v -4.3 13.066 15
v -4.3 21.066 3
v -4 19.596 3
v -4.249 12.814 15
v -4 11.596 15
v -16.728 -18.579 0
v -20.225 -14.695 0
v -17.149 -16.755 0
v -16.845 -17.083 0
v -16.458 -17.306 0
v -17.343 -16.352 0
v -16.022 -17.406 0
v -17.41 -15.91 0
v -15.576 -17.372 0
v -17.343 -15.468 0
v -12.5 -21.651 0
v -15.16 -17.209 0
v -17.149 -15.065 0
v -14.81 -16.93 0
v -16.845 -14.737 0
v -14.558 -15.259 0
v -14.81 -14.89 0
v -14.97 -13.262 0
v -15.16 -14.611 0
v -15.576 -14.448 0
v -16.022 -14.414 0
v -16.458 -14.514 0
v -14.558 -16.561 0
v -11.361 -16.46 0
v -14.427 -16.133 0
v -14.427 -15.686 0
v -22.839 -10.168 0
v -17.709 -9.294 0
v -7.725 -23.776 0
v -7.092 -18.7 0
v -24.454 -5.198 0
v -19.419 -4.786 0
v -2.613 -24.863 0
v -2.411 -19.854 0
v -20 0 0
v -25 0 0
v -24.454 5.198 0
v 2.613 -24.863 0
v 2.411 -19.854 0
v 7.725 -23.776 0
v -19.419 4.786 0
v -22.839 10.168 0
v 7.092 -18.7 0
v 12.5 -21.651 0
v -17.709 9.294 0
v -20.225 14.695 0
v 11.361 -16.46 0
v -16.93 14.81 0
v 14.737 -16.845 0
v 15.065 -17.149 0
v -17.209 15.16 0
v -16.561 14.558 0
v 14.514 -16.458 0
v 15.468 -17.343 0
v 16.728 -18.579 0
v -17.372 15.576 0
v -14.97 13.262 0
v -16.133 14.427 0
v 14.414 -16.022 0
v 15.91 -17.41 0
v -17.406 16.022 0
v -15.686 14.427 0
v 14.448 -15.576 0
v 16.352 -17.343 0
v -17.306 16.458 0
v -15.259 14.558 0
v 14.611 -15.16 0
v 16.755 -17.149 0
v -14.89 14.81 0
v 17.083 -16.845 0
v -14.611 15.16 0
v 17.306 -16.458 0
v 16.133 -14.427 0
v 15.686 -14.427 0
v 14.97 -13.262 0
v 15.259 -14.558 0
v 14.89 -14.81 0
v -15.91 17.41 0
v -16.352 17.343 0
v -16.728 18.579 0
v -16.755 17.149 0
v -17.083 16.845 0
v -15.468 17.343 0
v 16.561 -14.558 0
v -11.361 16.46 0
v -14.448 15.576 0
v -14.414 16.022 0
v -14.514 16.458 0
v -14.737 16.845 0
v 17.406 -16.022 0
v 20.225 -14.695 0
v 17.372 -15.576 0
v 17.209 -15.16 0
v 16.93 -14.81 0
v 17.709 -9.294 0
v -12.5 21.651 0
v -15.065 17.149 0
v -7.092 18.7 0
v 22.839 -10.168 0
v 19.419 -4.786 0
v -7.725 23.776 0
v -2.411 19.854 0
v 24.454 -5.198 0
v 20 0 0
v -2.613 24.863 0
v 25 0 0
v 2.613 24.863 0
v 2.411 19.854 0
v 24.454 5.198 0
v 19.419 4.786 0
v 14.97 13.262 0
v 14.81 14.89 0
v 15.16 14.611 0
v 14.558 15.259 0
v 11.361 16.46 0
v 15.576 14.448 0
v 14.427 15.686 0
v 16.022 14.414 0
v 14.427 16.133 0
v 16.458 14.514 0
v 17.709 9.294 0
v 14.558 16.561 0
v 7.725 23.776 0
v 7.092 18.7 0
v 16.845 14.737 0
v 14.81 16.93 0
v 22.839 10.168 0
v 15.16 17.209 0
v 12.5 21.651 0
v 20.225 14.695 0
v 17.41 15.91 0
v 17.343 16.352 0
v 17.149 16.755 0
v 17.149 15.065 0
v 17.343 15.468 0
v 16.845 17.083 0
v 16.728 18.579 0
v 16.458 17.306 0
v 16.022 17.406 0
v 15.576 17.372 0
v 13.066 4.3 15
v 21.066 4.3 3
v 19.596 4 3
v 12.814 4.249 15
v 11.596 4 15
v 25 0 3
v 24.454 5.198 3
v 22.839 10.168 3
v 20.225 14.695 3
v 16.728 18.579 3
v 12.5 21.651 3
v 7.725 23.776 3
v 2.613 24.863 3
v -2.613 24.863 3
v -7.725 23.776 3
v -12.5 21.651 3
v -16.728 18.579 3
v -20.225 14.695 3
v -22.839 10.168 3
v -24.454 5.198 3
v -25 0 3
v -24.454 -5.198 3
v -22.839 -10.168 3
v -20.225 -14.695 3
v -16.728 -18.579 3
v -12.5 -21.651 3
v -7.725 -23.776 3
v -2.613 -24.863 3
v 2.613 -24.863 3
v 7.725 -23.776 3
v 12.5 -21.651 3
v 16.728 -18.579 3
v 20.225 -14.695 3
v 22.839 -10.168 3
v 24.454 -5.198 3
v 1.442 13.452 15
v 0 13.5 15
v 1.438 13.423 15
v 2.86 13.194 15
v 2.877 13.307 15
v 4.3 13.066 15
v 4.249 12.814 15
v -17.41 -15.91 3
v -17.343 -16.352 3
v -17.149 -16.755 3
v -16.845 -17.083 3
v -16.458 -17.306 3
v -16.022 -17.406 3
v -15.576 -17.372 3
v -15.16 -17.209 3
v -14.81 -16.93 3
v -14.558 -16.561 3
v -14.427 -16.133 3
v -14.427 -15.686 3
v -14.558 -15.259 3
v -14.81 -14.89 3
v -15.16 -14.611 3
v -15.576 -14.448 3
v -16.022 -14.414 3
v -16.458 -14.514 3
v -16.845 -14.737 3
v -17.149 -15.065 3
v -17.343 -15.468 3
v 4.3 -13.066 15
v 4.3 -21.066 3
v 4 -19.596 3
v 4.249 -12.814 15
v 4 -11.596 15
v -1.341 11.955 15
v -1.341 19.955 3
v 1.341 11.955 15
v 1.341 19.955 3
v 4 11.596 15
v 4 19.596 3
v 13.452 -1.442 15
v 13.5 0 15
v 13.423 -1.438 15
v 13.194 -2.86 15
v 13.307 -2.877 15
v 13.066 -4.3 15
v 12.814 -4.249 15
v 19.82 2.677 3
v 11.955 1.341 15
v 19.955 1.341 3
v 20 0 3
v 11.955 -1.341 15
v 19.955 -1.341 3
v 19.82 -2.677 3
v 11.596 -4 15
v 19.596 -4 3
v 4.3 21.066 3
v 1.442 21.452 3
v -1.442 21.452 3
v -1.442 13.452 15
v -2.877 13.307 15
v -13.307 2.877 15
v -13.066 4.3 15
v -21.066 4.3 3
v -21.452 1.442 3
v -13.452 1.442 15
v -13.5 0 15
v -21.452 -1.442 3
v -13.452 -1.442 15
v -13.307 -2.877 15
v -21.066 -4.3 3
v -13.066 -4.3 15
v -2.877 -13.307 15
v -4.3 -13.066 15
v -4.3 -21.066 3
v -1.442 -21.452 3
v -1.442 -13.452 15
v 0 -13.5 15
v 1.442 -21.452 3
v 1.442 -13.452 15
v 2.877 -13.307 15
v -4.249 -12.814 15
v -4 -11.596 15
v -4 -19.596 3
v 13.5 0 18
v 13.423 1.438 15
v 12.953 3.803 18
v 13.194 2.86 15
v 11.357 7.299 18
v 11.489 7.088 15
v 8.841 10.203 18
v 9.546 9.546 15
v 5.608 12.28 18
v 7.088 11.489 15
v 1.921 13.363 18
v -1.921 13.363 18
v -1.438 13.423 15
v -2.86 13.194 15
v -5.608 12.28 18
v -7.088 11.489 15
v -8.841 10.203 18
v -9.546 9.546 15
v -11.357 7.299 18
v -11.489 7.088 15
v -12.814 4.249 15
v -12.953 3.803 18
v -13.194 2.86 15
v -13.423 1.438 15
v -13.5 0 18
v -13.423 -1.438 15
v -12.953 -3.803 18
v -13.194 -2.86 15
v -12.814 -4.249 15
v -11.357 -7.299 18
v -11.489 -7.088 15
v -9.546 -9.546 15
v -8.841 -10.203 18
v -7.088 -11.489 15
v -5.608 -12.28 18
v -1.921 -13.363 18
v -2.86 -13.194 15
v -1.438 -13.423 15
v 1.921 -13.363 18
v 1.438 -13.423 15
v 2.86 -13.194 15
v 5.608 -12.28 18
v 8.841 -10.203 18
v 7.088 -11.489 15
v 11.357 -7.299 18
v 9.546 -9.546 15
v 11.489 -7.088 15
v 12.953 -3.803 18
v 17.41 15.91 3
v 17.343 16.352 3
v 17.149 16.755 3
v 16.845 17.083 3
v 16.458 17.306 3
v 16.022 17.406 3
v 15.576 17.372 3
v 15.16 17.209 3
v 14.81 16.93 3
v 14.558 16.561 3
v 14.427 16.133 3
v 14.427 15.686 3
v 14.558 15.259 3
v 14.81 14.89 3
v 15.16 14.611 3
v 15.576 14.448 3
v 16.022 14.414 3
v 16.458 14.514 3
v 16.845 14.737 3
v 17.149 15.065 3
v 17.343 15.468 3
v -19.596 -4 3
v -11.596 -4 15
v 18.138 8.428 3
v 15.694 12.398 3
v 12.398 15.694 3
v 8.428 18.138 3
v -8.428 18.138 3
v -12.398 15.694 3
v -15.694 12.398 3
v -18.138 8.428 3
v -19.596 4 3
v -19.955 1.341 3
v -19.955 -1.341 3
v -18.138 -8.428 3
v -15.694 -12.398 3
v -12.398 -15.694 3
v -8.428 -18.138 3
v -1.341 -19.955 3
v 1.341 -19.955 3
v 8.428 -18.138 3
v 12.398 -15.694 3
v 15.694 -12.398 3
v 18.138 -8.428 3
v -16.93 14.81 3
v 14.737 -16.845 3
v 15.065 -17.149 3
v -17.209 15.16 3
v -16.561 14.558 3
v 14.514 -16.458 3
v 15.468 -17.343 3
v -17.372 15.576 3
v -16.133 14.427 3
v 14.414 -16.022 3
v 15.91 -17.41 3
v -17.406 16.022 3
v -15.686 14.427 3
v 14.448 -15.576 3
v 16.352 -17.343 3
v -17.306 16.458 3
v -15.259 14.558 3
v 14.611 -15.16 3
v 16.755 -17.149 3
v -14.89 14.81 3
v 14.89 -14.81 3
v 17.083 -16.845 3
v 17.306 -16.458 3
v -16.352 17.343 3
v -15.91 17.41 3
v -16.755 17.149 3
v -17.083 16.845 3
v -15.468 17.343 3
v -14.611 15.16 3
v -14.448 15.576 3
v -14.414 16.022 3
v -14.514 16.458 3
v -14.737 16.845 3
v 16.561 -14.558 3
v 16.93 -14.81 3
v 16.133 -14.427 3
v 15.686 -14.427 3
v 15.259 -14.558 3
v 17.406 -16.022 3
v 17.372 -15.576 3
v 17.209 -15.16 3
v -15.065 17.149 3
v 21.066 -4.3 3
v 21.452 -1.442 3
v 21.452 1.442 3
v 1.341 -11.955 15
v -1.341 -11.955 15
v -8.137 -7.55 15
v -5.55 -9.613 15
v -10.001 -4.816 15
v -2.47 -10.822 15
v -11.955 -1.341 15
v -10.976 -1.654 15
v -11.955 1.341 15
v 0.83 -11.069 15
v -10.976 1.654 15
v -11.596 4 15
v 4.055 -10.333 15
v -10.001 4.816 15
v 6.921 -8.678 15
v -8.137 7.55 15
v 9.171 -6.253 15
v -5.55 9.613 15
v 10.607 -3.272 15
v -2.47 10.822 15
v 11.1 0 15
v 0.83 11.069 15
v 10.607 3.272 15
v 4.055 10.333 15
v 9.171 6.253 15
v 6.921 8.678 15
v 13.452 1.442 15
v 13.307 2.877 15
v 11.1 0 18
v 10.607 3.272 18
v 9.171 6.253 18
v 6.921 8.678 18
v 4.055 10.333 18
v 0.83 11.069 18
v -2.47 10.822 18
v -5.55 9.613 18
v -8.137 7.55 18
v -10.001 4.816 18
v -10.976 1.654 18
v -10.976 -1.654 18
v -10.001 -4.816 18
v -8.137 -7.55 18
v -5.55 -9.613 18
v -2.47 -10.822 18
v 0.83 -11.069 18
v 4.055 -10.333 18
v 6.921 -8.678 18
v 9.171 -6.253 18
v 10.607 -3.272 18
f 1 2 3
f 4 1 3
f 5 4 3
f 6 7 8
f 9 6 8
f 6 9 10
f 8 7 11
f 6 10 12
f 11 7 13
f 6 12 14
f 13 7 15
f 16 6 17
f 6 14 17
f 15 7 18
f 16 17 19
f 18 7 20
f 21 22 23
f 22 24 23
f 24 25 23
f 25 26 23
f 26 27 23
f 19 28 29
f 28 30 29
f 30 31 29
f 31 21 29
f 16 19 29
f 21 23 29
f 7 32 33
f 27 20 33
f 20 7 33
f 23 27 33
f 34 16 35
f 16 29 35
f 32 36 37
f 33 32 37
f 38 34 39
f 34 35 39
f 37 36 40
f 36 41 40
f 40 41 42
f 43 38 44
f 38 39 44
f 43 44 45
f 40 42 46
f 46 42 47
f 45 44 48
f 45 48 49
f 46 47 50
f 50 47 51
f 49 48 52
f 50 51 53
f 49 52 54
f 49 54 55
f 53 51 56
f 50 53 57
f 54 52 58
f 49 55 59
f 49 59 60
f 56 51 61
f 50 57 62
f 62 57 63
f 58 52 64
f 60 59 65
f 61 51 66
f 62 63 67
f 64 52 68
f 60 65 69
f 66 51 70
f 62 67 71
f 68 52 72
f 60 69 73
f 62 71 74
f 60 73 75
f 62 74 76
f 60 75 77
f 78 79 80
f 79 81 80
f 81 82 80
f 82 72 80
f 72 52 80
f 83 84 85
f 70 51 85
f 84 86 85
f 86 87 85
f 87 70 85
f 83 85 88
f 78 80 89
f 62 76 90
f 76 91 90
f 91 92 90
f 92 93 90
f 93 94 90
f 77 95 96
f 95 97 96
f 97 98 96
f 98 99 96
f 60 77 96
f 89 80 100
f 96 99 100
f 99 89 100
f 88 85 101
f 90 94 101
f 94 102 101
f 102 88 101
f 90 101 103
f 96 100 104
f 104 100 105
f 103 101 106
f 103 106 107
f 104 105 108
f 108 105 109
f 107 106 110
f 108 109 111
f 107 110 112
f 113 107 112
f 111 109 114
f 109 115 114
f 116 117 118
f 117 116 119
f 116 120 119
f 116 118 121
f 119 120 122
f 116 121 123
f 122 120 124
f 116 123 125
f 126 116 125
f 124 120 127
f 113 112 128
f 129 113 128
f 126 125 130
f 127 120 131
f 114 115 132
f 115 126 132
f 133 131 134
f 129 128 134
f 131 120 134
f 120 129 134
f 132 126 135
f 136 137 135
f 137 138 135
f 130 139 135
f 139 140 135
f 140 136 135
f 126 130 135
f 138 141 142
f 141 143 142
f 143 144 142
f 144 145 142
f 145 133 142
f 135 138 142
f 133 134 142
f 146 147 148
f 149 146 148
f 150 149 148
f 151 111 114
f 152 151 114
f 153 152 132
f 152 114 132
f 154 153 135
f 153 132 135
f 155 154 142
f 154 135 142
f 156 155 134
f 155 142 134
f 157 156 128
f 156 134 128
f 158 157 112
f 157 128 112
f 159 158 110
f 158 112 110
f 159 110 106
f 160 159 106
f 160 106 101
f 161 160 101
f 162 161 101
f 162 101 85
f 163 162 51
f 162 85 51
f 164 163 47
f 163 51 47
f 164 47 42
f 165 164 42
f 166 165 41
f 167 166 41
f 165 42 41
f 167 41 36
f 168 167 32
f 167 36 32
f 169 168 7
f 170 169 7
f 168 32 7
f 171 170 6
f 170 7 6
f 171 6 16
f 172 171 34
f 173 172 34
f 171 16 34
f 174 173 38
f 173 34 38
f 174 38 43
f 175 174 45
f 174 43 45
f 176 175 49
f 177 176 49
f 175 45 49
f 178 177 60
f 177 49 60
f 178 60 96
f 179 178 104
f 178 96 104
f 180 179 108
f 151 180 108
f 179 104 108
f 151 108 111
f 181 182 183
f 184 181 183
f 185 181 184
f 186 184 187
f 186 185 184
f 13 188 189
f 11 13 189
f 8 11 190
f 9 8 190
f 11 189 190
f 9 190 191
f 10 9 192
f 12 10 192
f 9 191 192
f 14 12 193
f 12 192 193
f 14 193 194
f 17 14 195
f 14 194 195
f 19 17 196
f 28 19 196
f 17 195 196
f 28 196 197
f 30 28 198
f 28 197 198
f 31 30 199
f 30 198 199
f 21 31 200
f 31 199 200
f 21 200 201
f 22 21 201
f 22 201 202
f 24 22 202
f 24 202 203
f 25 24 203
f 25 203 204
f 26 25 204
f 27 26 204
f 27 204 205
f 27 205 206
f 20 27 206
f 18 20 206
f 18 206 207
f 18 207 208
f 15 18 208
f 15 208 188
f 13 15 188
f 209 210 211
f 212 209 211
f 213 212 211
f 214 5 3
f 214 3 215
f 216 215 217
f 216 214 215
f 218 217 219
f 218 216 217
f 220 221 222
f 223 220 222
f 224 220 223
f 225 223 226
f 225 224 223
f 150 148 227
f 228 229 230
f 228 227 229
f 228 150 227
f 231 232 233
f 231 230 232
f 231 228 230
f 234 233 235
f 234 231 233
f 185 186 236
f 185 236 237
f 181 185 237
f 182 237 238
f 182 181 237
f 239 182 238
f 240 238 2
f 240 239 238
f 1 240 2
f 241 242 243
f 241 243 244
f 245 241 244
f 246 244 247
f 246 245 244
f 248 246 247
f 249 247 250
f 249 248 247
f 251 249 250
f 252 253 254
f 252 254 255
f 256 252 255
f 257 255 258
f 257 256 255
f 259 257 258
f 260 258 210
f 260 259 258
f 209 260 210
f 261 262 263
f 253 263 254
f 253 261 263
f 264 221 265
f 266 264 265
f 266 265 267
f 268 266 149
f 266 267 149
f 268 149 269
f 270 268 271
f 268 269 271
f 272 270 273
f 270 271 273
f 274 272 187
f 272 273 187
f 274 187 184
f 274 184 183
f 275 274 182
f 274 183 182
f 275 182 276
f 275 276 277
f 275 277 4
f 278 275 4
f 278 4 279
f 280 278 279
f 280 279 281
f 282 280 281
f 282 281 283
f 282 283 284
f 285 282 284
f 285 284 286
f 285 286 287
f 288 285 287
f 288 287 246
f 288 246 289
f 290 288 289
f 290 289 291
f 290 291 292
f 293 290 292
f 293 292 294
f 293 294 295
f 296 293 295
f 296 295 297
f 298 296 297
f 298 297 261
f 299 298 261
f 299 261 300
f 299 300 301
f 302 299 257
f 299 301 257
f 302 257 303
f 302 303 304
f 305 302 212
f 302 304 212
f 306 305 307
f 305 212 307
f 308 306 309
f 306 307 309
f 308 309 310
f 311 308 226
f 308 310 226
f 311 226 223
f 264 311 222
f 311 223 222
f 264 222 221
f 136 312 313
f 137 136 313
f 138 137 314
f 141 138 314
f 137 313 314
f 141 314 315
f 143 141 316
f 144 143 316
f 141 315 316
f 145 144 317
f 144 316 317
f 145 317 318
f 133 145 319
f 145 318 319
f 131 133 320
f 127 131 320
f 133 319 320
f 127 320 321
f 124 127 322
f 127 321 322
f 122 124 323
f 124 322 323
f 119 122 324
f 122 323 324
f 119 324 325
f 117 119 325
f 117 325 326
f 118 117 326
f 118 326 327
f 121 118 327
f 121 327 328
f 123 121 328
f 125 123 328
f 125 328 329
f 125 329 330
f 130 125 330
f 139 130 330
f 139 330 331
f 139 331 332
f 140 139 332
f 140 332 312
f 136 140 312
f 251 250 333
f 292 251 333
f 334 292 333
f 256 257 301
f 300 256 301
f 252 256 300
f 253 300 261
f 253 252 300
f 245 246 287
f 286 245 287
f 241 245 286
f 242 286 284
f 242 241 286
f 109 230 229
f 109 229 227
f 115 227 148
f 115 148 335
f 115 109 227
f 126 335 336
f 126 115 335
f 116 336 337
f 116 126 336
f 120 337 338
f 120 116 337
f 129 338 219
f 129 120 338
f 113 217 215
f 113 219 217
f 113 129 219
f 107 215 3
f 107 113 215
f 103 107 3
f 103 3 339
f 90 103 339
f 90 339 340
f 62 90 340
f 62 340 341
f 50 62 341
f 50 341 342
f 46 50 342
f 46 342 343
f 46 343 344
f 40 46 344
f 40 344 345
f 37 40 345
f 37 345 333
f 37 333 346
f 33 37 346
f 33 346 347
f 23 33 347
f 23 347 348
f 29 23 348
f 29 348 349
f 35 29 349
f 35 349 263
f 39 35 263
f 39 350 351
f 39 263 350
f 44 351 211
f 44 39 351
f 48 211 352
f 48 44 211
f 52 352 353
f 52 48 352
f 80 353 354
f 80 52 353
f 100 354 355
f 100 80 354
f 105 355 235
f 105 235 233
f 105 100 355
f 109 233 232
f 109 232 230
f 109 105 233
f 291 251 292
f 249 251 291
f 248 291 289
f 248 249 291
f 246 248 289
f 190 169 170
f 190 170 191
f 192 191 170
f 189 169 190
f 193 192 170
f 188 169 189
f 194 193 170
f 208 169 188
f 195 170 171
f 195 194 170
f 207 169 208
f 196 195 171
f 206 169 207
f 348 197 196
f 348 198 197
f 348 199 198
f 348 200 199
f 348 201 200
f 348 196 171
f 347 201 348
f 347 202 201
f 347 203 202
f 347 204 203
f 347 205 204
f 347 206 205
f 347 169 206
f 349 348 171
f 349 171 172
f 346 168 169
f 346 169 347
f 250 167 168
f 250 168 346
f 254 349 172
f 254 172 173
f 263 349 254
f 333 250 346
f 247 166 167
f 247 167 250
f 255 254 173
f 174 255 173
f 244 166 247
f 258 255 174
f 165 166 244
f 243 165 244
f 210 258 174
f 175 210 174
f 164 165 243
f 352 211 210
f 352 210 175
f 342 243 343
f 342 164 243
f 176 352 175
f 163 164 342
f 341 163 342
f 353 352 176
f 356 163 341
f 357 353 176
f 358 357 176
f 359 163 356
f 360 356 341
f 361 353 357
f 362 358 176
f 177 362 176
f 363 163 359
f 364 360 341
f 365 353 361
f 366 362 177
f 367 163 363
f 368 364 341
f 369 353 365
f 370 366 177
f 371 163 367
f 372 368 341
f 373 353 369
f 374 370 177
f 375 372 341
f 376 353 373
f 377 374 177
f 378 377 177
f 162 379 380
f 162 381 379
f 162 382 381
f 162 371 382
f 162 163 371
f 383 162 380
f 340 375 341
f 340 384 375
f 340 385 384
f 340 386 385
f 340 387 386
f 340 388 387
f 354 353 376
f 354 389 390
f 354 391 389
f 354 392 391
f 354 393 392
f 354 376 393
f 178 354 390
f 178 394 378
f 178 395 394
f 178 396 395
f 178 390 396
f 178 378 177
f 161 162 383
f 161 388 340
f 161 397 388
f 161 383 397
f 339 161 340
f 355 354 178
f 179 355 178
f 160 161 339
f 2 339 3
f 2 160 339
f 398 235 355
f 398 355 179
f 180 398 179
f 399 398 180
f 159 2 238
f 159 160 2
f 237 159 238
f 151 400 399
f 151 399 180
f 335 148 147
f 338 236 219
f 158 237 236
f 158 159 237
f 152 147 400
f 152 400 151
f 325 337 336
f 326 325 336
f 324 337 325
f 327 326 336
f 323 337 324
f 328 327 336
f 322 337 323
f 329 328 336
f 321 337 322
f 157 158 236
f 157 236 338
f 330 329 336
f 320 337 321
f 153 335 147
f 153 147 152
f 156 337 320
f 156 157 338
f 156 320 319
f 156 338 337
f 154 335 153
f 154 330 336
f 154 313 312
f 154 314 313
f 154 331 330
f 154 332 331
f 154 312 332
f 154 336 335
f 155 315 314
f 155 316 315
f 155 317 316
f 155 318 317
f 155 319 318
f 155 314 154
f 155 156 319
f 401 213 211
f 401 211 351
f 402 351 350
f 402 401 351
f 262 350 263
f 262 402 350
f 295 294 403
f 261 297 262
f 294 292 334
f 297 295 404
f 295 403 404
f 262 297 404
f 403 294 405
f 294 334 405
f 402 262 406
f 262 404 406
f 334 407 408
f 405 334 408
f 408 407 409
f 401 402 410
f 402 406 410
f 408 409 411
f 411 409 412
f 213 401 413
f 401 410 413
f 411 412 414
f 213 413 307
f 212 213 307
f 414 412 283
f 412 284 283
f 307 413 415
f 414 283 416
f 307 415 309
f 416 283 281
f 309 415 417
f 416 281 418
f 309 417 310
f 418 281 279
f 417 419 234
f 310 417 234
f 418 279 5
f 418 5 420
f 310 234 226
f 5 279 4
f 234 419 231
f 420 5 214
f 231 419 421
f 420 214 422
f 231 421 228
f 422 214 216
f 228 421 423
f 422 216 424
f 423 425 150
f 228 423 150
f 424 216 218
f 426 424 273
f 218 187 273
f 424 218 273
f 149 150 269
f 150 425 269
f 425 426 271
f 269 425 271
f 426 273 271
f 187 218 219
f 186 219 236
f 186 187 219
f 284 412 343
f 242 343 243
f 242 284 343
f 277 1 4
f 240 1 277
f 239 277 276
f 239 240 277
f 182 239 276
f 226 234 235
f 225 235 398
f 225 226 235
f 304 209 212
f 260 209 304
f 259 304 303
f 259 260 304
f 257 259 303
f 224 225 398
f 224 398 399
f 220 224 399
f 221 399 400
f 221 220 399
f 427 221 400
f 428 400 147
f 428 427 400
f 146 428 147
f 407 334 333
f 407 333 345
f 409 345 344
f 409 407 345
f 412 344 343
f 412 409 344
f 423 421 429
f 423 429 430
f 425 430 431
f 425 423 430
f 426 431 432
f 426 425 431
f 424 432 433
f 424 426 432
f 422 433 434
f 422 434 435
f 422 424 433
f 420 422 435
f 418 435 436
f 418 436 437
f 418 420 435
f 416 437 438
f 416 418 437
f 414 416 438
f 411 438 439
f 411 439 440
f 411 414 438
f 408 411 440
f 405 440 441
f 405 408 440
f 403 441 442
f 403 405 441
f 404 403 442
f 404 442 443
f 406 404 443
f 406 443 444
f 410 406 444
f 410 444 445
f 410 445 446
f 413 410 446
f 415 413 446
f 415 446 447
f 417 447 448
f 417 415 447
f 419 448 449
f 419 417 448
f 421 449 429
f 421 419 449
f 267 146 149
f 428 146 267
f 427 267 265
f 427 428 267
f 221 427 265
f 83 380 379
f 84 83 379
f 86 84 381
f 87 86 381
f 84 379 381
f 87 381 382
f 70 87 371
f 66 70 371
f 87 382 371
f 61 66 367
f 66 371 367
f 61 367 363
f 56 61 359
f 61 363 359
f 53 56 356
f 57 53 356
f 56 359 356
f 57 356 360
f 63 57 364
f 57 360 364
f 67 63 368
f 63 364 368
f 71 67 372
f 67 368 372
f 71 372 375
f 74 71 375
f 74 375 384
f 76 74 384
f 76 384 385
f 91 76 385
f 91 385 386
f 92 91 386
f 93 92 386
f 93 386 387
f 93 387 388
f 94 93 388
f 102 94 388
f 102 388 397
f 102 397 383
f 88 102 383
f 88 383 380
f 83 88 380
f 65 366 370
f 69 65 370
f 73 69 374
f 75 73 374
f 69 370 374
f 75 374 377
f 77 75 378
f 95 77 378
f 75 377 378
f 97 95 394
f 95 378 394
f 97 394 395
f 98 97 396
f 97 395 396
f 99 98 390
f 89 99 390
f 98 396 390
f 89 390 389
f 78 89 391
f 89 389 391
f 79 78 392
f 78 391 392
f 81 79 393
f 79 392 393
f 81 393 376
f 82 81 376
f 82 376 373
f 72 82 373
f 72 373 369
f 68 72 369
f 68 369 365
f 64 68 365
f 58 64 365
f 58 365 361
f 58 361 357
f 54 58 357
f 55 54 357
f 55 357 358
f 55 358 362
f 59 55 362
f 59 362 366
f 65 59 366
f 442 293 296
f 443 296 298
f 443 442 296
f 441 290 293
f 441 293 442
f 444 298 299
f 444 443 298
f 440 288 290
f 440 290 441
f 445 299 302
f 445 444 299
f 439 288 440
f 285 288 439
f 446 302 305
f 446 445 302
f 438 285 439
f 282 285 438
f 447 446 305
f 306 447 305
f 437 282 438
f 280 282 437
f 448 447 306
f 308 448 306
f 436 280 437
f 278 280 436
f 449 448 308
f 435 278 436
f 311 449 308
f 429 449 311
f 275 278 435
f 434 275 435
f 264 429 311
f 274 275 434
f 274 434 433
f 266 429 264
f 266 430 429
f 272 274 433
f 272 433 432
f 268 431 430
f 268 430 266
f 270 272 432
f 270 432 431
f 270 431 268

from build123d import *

# Parameters (mm, degrees)
SKETCH1_R           = 25
SKETCH1_R_2         = 20
BOSS_EXTRUDE1_DEPTH = 3
SKETCH7_R           = 13.5
SKETCH7_R_2         = 11.1
BOSS_EXTRUDE2_DEPTH = 3
CIRPATTERN2_COUNT   = 4
SKETCH3_R           = 1.5
CUT_EXTRUDE1_DEPTH  = 4
CIRPATTERN1_COUNT   = 4


with BuildPart() as part:
    # Sketch1 → Boss-Extrude1 (new body)
    with BuildSketch(Plane.XY):
        Circle(SKETCH1_R)
        Circle(SKETCH1_R_2, mode=Mode.SUBTRACT)
    extrude(amount=BOSS_EXTRUDE1_DEPTH)



with BuildPart() as body_2:
    # Sketch7 → Boss-Extrude2 (new body)
    with BuildSketch(Plane.XY.offset(15)):
        Circle(SKETCH7_R)
        Circle(SKETCH7_R_2, mode=Mode.SUBTRACT)
    extrude(amount=BOSS_EXTRUDE2_DEPTH)


with BuildPart() as part_1:
    add(part.part)

    add(body_2.part)  # Sweep1 merges body 2
    # Sweep1: sweep along a curve in space
    with BuildLine() as sweep1_path:
        Line((0, 21.5, 3), (0, 13.5, 15))
    # Sketch8 → Sweep1 (sweep)
    with BuildSketch(Plane.XY.offset(3)):
        with BuildLine():
            Line((-4.3, 21.065611788), (-4, 19.595917942))
            ThreePointArc((-4, 19.595917942), (0, 20), (4, 19.595917942))
            Line((4, 19.595917942), (4.3, 21.065611788))
            ThreePointArc((4.3, 21.065611788), (0, 21.5), (-4.3, 21.065611788))
        make_face()
    sweep1 = sweep(path=sweep1_path.line)

    # CirPattern2: Sweep1 ×4 about axis
    cirpattern2_axis = Axis((0, 0, 0), (0, 0, -1))
    for i in range(1, CIRPATTERN2_COUNT):
        add(sweep1.rotate(cirpattern2_axis, i * 360 / CIRPATTERN2_COUNT))

    # Sketch3 → Cut-Extrude1 (cut, through all)
    with BuildSketch(Plane.XY.offset(3)):
        with Locations((15.909902577, 15.909902577)):
            Circle(SKETCH3_R)
    cut_extrude1 = extrude(amount=-CUT_EXTRUDE1_DEPTH, mode=Mode.SUBTRACT)

    # CirPattern1: Cut-Extrude1 ×4 about axis
    cirpattern1_axis = Axis((0, 0, 0), (0, 0, 1))
    for i in range(1, CIRPATTERN1_COUNT):
        add(cut_extrude1.rotate(cirpattern1_axis, i * 360 / CIRPATTERN1_COUNT), mode=Mode.SUBTRACT)


solid = part_1.part
